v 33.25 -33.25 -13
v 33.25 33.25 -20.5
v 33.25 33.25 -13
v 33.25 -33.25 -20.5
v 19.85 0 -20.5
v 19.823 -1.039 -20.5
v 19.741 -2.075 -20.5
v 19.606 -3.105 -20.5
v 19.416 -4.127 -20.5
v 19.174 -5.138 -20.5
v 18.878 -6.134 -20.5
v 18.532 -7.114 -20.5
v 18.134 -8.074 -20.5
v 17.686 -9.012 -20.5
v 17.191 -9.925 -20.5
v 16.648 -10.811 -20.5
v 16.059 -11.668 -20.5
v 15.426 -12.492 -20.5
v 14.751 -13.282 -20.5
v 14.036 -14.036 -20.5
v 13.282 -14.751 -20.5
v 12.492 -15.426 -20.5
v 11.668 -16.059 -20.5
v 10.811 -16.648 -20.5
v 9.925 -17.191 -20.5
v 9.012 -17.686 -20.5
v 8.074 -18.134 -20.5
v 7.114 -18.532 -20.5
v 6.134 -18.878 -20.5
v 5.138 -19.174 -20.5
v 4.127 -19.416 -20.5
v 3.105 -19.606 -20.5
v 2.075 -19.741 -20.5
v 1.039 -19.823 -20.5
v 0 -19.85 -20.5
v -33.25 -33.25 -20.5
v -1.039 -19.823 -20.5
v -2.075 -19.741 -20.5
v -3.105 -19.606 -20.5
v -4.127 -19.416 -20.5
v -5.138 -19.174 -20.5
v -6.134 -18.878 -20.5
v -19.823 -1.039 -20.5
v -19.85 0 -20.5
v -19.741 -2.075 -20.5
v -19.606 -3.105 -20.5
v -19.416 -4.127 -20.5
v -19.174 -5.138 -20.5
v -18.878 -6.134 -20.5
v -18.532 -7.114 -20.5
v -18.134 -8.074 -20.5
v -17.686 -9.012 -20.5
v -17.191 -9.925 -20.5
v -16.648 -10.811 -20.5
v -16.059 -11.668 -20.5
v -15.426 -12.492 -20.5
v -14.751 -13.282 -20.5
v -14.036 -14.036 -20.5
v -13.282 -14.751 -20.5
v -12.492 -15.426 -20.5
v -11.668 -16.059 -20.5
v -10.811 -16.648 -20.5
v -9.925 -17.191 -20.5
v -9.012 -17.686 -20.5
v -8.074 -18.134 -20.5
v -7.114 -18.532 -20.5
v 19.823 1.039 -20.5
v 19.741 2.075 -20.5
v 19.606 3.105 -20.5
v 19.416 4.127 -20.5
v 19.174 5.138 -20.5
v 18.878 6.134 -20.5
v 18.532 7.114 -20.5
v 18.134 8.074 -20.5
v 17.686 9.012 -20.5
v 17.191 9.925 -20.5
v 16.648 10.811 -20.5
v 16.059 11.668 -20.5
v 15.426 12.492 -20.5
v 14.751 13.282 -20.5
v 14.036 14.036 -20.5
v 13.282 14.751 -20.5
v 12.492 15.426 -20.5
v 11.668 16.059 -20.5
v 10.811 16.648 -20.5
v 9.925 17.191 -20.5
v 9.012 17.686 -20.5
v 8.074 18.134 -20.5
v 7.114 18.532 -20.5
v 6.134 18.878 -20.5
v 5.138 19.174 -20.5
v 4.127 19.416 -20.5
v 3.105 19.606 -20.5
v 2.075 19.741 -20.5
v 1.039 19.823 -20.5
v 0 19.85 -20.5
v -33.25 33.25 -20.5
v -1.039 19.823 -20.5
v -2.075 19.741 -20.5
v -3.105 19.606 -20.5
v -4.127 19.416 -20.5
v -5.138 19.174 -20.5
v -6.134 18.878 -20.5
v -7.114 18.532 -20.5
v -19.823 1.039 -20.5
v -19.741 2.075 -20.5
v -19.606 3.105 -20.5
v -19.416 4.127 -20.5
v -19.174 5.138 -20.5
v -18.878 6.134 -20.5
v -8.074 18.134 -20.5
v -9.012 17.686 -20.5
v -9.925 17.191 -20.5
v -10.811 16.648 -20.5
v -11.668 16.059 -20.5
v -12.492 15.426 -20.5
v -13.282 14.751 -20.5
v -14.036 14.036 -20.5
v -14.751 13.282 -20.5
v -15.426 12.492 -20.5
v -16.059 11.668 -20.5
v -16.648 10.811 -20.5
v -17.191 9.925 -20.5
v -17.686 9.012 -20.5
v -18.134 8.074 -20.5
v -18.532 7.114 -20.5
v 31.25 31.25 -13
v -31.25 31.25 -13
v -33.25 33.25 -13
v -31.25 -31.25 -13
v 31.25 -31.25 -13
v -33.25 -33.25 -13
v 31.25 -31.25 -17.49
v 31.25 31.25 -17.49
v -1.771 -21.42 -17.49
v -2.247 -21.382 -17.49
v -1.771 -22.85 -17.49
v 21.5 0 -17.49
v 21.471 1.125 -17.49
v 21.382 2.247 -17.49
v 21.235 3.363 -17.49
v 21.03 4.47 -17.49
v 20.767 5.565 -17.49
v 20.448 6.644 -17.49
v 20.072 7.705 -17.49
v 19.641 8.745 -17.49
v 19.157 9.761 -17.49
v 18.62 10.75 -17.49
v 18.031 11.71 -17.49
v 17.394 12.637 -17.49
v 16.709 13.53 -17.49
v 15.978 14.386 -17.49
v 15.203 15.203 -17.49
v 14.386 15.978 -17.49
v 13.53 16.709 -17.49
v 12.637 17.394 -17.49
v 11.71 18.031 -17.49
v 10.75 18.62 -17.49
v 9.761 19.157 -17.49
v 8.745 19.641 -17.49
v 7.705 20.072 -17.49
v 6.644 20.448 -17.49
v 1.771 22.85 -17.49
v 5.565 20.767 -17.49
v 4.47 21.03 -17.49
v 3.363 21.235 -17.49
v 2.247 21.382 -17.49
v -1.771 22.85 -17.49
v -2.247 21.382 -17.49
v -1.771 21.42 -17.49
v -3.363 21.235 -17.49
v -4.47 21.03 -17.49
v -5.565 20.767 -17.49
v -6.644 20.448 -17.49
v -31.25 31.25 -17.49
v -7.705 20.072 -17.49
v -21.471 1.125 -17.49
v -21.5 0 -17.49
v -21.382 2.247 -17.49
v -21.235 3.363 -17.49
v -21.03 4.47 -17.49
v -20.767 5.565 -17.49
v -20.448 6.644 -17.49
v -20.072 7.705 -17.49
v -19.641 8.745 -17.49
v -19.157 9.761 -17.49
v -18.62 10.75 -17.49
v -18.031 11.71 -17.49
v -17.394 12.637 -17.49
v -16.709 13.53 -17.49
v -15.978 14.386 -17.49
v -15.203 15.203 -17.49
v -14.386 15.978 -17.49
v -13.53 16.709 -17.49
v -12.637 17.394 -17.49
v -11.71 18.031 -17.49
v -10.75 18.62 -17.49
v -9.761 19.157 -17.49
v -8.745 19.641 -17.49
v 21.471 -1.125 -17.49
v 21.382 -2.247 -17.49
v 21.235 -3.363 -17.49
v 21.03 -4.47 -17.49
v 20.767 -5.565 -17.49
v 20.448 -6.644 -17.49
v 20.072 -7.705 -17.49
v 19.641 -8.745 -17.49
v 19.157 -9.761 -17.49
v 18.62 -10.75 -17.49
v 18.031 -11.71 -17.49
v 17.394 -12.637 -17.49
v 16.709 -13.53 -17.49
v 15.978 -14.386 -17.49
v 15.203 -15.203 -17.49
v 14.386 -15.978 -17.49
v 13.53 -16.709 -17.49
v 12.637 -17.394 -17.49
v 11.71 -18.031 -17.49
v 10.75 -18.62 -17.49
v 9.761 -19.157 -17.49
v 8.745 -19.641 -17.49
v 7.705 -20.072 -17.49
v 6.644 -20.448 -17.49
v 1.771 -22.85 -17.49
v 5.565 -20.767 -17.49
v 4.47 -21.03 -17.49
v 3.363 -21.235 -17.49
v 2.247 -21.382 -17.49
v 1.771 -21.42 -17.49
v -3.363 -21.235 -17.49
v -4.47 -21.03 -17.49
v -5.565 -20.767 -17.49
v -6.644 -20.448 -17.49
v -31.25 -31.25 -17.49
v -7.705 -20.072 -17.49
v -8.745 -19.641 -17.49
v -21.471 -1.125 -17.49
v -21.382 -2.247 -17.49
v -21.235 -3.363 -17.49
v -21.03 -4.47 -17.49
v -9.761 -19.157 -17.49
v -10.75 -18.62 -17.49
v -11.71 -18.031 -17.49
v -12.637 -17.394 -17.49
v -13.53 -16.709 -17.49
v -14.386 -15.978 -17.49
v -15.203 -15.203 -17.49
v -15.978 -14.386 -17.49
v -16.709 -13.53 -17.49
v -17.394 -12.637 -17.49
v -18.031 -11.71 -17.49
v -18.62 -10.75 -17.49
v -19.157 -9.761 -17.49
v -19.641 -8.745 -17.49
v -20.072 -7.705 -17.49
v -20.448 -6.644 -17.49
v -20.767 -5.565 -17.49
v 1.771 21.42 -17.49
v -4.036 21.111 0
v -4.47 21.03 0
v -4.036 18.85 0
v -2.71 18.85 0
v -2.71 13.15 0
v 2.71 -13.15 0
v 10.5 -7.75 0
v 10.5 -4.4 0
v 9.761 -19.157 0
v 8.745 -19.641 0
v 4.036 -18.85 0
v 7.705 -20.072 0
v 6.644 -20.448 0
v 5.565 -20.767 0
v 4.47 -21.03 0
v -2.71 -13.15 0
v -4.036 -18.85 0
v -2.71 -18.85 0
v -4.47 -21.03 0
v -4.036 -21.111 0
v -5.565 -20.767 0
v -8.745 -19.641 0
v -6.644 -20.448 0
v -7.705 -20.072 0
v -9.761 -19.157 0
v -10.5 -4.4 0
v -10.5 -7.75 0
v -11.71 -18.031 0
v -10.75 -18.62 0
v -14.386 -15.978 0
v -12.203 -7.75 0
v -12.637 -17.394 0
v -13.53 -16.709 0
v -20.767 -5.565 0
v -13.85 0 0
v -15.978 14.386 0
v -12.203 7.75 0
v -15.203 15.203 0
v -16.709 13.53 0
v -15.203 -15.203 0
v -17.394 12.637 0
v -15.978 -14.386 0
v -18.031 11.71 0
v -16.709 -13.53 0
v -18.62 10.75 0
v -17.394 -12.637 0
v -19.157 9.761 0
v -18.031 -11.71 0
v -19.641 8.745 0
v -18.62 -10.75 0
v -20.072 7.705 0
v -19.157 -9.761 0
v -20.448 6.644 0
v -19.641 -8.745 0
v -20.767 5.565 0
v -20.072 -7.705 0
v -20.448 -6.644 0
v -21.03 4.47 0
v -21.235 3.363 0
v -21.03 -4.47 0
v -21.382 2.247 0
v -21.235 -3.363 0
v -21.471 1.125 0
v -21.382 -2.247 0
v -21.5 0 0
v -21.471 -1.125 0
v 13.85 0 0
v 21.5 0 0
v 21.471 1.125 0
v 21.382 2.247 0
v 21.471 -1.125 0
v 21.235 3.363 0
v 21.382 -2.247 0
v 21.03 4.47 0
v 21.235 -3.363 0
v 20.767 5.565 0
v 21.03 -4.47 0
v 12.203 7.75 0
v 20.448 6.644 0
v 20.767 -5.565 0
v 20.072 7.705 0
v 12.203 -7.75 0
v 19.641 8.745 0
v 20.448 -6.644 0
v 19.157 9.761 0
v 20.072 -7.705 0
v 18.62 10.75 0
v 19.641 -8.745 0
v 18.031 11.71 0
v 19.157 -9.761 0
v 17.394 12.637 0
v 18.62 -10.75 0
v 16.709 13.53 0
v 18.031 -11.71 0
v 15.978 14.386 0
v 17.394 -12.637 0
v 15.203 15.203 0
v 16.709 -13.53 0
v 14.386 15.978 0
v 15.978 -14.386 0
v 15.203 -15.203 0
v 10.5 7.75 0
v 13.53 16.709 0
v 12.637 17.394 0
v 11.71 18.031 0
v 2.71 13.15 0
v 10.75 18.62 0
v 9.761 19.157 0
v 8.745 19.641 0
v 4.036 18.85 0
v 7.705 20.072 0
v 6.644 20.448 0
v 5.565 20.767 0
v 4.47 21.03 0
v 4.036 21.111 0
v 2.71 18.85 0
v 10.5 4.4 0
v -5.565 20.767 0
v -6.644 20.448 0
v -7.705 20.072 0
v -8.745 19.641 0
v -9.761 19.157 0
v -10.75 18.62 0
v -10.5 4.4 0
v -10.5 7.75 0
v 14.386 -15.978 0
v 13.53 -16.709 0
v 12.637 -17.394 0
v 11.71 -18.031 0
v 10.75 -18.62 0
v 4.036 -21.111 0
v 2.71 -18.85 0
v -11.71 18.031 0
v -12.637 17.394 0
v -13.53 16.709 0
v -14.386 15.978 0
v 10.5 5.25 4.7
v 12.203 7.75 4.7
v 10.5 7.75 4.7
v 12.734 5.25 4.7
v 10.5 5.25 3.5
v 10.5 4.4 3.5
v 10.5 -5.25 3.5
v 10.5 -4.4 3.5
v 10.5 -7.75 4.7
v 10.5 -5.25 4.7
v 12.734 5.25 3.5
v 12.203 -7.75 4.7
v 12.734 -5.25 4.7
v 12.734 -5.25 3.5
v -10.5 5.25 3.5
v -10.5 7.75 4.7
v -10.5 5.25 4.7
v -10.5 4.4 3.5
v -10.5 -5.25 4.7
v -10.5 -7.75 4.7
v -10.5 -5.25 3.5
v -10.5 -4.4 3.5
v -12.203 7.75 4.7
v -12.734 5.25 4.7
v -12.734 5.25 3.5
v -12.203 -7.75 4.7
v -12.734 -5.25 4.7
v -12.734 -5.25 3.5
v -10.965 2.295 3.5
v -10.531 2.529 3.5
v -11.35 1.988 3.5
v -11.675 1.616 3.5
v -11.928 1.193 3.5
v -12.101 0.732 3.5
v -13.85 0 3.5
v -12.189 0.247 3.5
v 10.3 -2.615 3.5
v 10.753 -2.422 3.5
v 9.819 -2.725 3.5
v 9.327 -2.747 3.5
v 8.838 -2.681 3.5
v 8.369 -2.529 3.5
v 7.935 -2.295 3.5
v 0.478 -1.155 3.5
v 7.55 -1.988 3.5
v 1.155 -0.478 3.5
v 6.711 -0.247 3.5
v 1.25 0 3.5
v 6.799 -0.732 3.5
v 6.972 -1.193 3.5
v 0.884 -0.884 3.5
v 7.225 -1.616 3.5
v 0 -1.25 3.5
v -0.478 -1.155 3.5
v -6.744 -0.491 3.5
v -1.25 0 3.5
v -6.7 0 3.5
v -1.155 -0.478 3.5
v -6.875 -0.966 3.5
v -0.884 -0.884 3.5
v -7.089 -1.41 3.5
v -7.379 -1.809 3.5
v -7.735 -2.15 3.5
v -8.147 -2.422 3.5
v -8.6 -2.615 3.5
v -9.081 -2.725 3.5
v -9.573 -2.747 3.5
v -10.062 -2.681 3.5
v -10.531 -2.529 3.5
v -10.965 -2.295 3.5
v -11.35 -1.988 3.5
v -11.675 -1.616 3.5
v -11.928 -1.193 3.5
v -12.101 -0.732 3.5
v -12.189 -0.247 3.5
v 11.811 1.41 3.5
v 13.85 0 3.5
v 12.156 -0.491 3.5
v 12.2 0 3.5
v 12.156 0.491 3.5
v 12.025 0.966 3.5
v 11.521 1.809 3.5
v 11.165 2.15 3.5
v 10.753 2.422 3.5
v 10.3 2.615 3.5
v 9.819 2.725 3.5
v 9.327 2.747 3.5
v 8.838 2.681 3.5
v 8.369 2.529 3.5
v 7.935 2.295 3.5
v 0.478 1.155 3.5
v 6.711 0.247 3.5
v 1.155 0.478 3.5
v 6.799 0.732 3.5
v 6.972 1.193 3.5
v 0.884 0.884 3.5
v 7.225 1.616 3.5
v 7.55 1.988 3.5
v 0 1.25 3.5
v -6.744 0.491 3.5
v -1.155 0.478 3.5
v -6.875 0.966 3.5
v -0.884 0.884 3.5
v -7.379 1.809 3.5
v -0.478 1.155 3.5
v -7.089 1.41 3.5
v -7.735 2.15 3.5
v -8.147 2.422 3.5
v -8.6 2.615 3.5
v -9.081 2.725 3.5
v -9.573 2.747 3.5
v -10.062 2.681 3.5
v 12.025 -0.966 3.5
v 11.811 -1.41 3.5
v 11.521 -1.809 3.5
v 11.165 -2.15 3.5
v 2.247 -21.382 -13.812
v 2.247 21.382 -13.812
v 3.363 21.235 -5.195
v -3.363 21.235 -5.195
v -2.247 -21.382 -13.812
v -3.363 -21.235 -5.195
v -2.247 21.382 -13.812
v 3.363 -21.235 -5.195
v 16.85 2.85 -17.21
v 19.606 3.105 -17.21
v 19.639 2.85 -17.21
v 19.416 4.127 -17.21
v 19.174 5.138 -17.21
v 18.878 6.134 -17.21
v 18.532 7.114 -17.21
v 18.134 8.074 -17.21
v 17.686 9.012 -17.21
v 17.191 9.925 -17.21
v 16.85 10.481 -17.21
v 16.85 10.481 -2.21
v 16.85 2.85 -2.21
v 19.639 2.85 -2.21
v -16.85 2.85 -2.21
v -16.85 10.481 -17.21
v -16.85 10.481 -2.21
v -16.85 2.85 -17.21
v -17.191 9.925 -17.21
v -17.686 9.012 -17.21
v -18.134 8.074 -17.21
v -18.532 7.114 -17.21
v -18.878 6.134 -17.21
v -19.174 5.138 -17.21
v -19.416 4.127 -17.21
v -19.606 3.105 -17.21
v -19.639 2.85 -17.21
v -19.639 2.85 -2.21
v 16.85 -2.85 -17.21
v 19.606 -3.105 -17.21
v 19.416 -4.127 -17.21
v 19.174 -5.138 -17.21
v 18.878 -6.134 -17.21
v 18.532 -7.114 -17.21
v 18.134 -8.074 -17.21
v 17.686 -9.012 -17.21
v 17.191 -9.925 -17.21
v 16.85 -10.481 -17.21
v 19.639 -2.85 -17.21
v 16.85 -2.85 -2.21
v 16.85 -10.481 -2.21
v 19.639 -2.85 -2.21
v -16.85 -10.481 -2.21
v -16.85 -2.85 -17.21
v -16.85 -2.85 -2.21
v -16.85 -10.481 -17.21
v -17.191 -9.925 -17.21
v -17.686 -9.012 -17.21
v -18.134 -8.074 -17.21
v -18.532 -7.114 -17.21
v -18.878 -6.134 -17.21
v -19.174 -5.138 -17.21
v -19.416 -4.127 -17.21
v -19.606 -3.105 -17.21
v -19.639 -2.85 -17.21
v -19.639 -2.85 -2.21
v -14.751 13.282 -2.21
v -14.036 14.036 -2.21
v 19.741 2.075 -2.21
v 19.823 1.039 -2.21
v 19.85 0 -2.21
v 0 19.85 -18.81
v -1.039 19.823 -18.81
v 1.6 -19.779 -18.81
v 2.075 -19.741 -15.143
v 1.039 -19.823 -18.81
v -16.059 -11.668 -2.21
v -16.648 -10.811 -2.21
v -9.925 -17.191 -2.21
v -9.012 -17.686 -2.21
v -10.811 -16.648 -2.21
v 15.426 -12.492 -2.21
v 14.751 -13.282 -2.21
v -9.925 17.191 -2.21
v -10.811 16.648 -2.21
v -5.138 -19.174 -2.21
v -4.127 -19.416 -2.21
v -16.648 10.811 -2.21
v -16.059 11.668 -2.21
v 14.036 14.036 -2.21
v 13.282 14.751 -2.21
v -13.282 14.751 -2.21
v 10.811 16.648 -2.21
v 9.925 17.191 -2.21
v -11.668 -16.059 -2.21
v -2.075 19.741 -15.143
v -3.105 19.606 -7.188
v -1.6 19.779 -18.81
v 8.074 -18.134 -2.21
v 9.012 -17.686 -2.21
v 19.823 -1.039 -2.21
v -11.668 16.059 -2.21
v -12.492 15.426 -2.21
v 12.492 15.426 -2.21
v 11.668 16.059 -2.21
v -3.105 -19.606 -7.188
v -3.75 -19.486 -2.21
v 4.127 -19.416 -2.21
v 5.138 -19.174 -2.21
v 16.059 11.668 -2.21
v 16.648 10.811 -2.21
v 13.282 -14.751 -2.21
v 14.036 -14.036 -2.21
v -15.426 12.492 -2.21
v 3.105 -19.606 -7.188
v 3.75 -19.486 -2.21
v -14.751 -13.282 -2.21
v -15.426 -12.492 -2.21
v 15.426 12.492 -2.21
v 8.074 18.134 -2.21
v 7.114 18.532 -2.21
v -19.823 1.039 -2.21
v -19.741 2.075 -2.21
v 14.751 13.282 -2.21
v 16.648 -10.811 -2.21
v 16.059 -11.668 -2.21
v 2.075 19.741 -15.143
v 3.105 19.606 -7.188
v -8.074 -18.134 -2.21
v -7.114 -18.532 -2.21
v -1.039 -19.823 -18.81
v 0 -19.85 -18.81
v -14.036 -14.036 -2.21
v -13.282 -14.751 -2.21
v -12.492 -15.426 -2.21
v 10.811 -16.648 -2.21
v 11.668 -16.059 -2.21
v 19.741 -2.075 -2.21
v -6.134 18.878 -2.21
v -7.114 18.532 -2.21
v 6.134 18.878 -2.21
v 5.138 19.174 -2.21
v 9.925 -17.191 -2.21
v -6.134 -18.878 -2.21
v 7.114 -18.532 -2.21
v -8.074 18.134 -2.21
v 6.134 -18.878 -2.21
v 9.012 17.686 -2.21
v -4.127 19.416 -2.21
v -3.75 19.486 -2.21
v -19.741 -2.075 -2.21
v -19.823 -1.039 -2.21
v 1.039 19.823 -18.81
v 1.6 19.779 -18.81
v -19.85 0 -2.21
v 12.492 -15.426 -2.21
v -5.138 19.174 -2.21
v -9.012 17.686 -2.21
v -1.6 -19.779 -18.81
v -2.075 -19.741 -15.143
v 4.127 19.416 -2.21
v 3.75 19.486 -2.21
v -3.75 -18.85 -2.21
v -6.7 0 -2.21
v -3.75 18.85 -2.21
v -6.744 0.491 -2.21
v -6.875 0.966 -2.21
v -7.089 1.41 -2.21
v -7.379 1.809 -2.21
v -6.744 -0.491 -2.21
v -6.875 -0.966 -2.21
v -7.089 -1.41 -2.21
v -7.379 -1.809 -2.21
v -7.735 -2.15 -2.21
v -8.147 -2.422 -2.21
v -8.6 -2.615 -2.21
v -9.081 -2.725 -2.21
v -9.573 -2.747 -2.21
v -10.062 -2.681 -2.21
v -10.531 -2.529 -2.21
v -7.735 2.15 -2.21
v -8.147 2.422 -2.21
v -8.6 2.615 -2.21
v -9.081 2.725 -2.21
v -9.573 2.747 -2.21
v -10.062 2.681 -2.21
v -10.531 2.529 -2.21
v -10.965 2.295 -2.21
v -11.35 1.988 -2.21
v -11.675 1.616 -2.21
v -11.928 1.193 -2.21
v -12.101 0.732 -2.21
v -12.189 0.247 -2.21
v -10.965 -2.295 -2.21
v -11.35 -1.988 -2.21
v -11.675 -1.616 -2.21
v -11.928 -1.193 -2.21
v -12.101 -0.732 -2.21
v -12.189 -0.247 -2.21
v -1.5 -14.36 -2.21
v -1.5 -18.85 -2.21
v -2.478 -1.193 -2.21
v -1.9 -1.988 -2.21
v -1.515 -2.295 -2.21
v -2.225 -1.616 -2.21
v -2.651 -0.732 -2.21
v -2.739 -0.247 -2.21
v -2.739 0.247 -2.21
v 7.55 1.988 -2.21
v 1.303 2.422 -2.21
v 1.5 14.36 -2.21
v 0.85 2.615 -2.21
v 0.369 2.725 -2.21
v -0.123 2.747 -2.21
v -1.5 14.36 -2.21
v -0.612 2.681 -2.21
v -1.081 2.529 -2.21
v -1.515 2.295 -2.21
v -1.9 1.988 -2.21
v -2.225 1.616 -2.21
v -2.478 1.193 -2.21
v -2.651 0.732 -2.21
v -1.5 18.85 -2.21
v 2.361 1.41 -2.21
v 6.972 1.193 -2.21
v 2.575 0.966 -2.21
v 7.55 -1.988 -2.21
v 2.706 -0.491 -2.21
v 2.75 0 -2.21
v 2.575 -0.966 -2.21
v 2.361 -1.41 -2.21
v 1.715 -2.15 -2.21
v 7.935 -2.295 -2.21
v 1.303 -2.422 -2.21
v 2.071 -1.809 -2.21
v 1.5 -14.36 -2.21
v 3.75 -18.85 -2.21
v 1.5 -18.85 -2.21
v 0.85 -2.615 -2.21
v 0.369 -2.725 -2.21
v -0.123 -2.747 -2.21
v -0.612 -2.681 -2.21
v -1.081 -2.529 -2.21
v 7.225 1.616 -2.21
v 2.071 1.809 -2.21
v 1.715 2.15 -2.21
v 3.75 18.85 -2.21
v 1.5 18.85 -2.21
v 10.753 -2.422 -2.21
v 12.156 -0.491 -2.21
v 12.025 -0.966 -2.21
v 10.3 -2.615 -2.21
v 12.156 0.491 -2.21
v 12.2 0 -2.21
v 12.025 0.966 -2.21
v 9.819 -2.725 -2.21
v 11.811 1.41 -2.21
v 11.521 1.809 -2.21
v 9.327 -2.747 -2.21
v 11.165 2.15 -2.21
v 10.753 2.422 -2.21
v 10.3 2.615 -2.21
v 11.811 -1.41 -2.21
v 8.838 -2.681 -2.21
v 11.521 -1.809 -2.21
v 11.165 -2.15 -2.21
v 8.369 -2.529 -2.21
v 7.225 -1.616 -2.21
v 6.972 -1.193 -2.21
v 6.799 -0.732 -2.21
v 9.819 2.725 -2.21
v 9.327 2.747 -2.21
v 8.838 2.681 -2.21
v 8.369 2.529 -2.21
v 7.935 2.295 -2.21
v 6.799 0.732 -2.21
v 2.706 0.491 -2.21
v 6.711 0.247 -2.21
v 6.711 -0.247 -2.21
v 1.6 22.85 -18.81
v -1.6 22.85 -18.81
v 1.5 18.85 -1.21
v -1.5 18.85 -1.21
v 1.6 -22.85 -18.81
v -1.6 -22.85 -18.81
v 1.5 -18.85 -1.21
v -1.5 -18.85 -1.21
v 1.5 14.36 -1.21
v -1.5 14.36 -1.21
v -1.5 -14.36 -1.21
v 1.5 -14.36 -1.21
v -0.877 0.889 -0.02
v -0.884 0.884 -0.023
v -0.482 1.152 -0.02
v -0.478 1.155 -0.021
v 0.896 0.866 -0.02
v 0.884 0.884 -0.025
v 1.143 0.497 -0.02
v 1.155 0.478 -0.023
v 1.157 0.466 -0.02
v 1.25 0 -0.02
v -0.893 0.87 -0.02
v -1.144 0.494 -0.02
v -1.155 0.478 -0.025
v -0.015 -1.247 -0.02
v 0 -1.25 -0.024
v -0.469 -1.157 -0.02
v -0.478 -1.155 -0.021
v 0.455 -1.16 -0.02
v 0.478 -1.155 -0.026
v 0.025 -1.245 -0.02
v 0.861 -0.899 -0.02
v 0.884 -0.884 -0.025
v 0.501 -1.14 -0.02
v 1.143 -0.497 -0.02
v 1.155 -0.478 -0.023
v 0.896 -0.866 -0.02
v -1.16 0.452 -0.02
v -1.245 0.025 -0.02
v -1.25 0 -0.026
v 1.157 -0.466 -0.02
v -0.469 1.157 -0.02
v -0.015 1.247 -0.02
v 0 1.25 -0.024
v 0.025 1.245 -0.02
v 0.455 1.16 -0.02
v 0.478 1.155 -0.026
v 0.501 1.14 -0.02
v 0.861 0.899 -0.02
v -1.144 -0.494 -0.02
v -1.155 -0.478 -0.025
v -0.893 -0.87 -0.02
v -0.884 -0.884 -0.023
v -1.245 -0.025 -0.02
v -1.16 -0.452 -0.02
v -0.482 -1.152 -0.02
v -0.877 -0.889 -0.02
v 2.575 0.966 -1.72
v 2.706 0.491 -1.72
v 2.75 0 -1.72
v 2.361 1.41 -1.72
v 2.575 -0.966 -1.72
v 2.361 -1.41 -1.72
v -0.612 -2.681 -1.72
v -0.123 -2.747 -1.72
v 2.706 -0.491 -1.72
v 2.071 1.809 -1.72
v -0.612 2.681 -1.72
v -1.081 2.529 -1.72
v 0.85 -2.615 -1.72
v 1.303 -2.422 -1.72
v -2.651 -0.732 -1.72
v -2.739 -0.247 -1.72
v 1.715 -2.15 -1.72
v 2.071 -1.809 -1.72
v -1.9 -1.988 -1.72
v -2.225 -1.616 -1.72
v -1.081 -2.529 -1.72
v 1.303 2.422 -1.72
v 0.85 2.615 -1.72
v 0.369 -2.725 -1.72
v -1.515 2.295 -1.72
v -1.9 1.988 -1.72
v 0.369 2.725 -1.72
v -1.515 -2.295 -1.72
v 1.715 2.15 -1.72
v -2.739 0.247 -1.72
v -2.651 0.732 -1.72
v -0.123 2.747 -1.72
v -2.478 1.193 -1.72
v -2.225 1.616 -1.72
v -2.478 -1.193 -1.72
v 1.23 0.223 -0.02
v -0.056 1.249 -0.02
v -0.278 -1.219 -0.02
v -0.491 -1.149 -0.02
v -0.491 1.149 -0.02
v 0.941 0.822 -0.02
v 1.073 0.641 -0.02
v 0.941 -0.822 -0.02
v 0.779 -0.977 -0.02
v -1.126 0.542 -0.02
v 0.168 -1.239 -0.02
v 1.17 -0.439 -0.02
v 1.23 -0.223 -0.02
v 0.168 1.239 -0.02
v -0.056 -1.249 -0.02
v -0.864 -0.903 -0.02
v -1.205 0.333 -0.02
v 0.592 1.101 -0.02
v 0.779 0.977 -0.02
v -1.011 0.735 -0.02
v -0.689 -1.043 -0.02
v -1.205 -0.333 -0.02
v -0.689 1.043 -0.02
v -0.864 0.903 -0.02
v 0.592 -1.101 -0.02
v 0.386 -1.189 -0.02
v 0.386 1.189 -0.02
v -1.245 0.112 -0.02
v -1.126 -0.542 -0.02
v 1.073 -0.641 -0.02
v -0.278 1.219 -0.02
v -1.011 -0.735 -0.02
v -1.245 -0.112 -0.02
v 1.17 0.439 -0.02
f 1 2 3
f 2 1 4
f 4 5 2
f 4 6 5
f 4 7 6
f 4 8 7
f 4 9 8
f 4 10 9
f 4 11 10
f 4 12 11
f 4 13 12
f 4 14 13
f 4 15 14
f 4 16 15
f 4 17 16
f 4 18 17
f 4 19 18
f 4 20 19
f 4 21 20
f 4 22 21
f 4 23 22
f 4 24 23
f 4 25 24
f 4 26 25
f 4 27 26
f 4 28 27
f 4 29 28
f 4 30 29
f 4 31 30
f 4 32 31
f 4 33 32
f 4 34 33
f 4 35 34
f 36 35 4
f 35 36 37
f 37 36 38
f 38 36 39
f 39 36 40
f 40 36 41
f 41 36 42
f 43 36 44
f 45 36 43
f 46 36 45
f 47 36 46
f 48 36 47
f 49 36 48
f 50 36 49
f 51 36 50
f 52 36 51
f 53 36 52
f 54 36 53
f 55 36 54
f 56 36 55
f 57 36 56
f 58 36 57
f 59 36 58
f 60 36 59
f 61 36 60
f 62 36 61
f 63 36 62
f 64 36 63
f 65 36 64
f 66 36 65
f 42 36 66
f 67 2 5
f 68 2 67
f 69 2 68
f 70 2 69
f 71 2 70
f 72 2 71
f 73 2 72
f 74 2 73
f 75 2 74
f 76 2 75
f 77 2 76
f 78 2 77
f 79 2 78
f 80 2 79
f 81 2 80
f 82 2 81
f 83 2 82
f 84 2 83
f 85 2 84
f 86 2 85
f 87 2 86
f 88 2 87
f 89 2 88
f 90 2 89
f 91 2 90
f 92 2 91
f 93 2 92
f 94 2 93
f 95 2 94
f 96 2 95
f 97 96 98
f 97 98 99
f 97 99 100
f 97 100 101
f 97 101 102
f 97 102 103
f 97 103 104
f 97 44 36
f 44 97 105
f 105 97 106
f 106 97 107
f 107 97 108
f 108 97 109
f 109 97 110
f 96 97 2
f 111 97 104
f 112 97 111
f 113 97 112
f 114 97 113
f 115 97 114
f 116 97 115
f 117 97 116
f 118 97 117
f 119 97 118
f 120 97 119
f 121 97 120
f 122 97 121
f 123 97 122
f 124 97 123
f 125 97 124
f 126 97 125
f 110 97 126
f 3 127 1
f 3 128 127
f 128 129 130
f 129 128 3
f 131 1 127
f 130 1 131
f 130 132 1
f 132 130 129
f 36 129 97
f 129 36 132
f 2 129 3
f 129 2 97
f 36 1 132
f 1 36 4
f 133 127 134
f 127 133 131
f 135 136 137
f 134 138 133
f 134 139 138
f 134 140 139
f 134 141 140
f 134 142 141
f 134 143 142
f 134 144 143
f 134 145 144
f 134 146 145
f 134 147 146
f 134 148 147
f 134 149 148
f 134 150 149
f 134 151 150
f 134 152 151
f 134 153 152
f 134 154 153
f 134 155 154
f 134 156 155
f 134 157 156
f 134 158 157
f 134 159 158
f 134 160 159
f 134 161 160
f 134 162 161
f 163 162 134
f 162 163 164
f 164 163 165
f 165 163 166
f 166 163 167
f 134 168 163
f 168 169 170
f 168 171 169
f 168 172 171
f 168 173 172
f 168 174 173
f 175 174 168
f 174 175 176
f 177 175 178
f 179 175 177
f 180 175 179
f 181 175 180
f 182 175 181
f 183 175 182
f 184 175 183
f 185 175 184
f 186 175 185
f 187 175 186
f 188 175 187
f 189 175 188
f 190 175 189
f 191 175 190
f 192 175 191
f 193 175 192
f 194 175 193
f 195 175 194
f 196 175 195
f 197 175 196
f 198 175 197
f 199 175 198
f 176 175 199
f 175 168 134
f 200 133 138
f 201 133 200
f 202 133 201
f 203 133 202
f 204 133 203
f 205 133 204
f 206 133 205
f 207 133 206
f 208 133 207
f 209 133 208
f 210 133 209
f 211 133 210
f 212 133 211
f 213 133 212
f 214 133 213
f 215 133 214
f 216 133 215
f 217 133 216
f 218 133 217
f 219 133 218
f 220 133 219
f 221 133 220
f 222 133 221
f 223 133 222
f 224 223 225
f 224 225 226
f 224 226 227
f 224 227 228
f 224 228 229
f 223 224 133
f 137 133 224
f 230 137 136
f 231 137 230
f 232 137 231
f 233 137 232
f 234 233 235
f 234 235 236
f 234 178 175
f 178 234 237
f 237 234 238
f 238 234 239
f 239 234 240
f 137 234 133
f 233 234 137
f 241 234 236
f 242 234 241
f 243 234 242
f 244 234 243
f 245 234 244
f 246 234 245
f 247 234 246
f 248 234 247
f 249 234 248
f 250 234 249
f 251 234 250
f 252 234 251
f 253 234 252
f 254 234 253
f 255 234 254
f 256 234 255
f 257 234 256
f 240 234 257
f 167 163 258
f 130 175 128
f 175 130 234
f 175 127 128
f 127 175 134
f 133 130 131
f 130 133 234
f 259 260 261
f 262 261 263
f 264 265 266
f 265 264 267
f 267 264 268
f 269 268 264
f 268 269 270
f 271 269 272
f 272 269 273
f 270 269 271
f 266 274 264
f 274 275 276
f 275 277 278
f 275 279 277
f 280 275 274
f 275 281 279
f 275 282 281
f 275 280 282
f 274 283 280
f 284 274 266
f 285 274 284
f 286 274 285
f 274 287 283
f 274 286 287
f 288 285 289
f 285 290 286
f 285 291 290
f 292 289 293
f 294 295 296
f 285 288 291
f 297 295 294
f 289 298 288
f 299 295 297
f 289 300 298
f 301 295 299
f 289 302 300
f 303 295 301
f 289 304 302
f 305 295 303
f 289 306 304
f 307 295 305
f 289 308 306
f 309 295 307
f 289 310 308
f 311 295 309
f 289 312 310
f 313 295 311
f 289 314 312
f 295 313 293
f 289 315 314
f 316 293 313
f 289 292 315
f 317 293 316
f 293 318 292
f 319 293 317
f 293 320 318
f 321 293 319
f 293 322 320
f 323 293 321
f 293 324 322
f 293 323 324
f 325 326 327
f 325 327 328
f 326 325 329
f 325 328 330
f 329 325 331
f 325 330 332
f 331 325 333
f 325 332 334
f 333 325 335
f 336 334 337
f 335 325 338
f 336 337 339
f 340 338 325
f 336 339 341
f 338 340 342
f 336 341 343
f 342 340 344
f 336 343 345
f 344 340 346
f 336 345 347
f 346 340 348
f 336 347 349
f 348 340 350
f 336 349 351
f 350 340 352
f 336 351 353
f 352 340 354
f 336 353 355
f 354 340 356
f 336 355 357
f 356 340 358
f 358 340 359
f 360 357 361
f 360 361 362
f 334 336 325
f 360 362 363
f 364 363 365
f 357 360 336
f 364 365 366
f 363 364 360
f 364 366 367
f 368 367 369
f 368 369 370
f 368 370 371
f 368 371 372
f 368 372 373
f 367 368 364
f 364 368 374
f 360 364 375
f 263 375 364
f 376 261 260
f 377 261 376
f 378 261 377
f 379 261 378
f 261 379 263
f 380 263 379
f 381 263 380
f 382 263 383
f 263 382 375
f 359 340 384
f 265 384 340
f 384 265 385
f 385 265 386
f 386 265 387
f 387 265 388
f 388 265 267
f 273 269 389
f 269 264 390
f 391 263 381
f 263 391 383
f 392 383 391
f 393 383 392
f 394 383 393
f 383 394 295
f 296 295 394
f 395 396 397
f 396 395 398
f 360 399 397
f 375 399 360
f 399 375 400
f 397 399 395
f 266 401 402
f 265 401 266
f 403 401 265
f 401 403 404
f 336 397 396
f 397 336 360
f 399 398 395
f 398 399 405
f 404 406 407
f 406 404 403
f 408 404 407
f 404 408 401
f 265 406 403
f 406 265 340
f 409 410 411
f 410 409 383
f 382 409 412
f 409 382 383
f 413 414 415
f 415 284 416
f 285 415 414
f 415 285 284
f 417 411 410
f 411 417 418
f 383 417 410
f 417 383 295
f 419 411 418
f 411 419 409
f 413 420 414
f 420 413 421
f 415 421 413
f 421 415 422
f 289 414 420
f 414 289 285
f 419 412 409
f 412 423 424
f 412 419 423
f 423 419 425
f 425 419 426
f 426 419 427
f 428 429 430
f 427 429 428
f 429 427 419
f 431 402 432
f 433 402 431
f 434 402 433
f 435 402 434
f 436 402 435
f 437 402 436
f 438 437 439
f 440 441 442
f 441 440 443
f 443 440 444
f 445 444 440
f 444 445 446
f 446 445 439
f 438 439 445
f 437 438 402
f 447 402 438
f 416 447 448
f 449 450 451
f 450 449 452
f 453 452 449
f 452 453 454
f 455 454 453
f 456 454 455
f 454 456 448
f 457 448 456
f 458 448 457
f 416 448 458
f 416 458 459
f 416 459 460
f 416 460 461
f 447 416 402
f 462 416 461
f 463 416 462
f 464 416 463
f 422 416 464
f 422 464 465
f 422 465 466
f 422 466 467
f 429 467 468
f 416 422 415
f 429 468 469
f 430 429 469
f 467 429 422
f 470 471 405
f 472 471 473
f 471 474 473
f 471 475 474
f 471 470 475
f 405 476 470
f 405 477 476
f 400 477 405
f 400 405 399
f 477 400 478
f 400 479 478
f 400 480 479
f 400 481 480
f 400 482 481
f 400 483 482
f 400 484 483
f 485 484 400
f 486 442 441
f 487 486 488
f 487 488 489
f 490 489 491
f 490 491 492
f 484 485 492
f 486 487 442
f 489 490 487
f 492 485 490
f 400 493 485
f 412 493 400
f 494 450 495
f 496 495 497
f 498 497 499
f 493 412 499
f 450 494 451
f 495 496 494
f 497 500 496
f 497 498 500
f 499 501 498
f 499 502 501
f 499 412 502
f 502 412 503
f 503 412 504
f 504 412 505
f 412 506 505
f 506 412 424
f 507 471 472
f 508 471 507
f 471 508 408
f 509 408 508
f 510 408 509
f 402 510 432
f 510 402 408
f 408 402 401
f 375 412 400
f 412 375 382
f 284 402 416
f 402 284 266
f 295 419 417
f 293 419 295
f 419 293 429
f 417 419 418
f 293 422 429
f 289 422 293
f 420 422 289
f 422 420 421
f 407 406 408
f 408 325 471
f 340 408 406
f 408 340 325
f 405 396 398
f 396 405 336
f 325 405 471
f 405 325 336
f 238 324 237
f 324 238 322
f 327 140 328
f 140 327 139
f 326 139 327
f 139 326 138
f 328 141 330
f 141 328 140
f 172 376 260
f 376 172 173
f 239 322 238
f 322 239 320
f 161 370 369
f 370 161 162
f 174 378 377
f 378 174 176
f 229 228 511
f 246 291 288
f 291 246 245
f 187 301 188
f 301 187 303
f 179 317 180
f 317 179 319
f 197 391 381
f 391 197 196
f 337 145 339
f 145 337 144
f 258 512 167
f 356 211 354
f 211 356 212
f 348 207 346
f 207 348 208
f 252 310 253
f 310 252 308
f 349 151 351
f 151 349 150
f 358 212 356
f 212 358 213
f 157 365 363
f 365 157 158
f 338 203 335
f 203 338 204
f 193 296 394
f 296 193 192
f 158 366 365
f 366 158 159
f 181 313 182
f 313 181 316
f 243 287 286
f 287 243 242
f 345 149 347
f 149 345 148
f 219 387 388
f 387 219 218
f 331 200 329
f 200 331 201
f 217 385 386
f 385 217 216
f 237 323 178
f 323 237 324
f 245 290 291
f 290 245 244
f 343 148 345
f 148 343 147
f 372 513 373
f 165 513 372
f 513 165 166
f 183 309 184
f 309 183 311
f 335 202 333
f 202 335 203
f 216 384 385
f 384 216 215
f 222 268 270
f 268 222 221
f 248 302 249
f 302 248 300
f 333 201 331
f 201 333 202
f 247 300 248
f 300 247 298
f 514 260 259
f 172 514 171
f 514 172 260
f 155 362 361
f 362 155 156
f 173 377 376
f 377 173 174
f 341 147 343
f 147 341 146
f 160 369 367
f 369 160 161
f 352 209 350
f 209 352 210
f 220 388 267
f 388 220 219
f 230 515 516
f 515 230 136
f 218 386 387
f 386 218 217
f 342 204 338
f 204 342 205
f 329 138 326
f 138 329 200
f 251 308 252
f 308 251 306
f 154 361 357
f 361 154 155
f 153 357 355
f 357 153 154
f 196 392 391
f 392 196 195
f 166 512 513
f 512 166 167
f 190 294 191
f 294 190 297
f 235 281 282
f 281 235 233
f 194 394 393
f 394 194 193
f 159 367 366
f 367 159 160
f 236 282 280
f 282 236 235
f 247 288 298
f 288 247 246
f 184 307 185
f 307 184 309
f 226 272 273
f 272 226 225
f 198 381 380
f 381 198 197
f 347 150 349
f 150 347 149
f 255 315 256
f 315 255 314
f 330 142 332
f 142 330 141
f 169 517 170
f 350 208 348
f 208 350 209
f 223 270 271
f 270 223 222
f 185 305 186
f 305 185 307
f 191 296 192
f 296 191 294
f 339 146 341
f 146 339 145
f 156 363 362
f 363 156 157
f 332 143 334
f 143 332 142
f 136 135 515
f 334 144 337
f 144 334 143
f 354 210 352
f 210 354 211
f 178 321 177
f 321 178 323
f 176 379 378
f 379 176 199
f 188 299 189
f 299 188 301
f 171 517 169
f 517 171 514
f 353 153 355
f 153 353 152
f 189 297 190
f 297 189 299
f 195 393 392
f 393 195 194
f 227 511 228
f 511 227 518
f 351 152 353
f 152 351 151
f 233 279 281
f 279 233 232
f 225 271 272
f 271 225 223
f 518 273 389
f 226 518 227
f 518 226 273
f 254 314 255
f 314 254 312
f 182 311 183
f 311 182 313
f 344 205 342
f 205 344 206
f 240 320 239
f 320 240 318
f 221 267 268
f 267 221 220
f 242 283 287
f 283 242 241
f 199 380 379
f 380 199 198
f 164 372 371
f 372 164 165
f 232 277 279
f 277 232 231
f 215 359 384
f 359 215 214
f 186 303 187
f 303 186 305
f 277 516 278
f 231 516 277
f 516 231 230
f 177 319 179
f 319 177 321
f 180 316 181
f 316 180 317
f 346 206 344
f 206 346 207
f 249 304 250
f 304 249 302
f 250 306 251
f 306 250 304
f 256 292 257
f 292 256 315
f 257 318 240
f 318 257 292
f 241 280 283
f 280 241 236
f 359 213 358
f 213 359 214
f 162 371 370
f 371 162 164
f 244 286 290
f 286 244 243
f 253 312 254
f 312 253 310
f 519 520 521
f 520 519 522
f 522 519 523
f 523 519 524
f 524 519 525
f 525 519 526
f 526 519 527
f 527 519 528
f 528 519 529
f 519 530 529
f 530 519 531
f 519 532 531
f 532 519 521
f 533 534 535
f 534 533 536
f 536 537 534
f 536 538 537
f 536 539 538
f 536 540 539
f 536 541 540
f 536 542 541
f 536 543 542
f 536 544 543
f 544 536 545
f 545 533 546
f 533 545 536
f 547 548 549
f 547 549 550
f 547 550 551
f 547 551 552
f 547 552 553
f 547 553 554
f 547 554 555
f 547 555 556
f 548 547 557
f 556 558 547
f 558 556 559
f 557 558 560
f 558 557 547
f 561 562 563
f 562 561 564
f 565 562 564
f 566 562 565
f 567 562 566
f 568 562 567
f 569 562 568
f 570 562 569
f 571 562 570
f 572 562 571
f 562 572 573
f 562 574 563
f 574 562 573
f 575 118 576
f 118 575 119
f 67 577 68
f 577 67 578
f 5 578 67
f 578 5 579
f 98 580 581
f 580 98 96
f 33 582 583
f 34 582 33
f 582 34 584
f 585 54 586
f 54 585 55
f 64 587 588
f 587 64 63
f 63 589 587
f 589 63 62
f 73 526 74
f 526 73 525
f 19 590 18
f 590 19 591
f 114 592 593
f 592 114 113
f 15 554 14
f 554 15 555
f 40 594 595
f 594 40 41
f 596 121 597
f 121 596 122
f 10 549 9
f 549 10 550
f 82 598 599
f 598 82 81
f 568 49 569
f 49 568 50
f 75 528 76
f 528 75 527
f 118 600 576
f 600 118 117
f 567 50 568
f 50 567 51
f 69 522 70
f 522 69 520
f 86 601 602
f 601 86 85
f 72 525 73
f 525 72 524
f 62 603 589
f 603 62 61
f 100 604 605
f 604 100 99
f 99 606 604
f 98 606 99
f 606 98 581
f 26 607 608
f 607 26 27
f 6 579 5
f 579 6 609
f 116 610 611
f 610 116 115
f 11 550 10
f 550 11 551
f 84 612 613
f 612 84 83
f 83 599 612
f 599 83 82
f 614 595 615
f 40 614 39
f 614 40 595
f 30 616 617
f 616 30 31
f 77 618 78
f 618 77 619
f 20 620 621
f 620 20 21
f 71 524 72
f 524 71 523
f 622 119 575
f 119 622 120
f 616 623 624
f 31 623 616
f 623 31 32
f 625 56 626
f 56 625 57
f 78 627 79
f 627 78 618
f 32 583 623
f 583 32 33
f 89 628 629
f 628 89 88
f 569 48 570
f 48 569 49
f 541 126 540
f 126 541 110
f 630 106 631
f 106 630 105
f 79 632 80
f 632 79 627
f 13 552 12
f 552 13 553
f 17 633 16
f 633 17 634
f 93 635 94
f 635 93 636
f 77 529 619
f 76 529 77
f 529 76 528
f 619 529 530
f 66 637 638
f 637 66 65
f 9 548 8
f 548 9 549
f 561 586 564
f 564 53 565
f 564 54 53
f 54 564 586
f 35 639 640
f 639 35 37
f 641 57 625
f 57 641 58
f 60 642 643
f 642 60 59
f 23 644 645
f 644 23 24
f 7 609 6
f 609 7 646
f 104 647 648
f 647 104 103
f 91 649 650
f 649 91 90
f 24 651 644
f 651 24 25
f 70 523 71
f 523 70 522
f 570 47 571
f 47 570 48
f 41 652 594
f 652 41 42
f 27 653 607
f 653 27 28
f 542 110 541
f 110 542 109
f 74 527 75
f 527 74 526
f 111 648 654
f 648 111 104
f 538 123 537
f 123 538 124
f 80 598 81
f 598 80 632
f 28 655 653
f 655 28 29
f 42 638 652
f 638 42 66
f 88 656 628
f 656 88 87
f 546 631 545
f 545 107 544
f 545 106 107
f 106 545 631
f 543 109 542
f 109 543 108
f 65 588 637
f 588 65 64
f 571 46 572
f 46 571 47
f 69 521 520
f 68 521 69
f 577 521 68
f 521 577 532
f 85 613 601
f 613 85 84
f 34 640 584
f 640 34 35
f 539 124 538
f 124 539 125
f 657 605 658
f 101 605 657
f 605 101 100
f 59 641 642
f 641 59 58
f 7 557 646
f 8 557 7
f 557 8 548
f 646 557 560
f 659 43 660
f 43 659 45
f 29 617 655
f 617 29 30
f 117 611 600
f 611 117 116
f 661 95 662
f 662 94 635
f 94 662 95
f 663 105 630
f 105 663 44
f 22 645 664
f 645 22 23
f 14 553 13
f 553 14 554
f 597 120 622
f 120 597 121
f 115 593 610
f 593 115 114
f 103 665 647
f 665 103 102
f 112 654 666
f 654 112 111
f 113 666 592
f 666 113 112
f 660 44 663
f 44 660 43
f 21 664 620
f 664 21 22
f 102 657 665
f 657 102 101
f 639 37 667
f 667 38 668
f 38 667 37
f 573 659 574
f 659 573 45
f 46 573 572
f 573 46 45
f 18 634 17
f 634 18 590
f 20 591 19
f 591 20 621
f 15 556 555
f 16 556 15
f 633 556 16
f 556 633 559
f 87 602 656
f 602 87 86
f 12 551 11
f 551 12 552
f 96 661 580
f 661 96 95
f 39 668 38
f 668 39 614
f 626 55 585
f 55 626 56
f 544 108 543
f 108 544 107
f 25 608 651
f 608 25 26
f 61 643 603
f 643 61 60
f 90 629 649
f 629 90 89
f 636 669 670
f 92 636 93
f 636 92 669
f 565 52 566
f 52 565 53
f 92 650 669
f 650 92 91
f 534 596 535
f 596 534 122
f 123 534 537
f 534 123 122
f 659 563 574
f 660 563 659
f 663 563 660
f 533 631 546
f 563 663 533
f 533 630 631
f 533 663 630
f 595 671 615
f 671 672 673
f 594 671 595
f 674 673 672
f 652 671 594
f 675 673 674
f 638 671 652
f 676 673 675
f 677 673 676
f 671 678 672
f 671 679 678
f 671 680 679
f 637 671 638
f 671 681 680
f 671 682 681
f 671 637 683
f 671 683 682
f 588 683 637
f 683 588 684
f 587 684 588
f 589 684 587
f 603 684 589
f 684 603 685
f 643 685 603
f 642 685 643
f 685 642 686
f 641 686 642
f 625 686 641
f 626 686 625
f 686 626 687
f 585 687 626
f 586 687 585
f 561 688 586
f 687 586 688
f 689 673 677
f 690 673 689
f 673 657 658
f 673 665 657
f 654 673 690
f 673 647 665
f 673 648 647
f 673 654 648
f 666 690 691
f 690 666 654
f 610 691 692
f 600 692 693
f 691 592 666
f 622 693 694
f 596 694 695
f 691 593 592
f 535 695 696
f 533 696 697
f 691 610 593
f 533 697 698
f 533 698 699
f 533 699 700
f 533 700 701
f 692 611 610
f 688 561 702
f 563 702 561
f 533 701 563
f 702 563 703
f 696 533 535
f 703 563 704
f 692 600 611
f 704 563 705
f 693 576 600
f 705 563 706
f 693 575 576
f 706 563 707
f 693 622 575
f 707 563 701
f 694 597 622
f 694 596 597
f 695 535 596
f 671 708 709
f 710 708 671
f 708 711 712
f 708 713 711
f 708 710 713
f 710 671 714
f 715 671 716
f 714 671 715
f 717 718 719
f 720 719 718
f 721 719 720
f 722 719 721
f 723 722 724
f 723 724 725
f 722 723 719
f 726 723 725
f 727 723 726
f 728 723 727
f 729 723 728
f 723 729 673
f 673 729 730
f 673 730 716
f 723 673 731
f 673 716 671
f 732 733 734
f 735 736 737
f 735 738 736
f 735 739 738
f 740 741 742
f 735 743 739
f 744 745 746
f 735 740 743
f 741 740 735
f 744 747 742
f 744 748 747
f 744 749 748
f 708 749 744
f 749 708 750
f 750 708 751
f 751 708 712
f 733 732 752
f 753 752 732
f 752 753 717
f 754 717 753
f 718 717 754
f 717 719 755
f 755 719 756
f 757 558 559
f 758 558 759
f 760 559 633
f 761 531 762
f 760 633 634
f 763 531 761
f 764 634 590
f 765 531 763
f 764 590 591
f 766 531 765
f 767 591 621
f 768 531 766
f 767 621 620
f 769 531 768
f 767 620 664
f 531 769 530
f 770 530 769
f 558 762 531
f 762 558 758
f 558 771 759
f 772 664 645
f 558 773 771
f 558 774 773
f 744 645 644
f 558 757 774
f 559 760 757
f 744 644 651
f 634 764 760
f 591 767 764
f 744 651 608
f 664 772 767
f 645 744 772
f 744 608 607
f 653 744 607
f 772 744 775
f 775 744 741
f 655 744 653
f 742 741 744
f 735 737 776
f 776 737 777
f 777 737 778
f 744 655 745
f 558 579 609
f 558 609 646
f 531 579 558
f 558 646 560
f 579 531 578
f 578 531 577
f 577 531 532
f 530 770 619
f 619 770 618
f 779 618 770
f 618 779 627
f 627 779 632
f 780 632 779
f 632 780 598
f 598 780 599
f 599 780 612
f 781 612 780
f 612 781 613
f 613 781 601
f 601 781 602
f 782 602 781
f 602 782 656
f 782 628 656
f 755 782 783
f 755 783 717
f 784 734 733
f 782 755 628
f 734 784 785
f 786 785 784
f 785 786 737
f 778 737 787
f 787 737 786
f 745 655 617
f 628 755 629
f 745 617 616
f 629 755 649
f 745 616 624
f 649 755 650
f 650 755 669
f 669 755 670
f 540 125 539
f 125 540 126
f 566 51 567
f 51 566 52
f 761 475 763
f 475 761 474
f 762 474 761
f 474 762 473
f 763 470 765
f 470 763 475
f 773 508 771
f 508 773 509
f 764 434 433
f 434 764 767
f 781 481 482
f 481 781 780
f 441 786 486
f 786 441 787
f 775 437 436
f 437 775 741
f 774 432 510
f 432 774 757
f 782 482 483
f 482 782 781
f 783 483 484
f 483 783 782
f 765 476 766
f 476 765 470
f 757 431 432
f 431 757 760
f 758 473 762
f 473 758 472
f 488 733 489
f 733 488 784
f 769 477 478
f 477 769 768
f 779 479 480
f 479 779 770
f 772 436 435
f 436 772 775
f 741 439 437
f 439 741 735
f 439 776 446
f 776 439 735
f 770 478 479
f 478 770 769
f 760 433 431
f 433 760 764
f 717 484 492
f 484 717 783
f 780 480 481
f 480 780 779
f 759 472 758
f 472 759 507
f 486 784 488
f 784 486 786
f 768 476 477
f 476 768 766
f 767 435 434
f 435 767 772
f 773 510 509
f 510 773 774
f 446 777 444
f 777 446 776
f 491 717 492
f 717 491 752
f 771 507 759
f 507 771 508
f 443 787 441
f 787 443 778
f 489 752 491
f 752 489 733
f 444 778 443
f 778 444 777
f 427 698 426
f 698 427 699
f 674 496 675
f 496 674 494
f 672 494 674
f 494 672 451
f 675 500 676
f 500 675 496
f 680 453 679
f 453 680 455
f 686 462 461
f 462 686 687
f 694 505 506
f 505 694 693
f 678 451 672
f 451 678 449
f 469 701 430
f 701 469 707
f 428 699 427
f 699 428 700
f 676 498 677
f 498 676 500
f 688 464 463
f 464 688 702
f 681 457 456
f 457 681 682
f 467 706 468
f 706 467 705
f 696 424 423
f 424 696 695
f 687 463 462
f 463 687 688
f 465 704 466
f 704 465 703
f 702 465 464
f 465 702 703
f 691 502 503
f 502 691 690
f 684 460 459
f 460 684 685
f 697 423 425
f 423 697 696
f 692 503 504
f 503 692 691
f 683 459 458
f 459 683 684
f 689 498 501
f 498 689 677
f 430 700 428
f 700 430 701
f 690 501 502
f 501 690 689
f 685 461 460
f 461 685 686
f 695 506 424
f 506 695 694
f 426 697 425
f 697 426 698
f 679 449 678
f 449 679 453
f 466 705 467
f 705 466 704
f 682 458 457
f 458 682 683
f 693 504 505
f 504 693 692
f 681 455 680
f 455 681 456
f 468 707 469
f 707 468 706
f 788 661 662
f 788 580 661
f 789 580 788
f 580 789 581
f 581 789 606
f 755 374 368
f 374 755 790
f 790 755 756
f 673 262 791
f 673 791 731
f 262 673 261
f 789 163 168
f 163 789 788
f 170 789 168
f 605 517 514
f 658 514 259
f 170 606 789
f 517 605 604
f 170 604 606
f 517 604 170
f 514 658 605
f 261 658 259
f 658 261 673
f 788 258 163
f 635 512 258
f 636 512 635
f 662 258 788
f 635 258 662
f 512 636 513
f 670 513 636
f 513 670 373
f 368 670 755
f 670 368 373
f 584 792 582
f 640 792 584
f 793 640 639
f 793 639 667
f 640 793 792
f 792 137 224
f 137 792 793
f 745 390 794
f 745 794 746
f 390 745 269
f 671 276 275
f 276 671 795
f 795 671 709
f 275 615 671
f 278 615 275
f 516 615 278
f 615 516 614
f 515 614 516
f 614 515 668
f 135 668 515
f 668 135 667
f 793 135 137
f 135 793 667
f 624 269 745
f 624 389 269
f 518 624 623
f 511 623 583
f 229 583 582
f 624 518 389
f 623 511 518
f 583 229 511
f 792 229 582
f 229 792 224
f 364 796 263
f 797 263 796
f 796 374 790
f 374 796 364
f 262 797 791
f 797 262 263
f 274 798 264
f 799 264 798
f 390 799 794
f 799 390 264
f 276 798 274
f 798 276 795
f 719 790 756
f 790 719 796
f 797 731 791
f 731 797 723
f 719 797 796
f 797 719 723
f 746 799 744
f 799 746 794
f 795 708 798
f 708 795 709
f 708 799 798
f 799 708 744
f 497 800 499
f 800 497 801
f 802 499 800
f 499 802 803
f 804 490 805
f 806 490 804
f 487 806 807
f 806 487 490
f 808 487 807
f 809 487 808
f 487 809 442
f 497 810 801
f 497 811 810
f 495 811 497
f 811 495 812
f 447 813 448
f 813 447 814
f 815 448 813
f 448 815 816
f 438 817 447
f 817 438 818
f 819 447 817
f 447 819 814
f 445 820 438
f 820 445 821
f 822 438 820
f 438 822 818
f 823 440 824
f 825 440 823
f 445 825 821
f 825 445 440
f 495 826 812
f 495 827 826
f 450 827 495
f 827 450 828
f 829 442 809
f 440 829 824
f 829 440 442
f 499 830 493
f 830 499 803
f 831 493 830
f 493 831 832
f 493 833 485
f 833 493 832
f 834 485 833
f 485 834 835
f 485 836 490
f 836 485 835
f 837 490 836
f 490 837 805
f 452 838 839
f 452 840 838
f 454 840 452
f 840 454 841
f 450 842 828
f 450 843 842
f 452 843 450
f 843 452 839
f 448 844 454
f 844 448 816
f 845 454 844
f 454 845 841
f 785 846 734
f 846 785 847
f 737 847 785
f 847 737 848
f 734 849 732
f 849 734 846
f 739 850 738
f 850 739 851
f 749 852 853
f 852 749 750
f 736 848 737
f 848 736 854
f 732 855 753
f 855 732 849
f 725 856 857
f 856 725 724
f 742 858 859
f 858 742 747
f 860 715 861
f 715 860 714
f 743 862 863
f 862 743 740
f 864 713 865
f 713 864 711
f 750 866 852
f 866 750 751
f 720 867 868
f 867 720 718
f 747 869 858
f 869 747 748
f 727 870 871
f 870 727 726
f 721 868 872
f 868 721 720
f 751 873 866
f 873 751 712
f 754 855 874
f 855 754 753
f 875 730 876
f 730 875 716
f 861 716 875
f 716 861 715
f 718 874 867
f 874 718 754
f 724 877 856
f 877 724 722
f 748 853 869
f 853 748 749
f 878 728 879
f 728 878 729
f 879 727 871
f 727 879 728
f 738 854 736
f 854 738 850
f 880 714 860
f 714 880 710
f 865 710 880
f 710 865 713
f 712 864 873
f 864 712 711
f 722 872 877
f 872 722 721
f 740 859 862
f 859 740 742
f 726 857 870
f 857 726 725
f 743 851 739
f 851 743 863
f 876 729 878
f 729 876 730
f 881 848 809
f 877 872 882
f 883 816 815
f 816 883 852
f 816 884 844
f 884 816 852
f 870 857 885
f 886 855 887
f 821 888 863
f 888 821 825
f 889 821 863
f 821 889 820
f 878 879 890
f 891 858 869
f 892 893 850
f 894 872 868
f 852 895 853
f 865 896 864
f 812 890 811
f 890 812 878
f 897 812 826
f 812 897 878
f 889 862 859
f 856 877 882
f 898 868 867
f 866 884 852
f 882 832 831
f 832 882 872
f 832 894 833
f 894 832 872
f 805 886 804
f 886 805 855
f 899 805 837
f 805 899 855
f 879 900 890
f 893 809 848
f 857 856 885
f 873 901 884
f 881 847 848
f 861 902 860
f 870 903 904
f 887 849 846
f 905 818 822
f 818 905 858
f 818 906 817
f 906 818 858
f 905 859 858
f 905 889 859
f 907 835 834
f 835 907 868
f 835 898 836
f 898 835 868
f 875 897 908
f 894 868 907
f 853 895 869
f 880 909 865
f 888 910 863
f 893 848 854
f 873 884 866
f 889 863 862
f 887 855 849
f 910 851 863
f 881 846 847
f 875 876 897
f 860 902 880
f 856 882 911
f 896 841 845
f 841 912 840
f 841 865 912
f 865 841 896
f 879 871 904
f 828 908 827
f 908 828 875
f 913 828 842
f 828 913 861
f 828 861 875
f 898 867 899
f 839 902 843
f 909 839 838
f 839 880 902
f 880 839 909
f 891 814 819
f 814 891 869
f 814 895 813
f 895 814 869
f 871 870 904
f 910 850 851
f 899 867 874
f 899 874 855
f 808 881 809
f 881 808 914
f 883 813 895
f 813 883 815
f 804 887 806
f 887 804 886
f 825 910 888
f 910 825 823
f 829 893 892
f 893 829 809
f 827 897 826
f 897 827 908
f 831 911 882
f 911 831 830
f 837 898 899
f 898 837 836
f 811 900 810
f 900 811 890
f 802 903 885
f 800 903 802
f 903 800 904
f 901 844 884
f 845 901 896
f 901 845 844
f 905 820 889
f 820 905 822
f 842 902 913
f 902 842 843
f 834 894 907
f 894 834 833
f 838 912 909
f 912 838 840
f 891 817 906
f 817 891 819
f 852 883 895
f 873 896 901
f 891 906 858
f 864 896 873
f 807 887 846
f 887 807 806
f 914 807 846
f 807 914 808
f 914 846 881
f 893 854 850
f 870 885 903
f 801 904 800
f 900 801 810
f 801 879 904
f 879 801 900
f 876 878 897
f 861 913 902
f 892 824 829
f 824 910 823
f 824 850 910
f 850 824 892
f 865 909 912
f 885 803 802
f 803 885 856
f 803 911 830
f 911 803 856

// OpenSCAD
// file: lib/lib/slice.scad
// Starts at Y-axis in negative clock direction
module slice (r = 10, h = 10, ang = 30) {
    aa = (ang % 360 > 0) ? ang % 360 : ang % 360 + 360;
    rotate (-90) {
        difference() {
            cylinder (r = r, h = h);
            if (aa > 180)
                intersection_for (a = [0, 180 - aa])
                    rotate(-a) translate([-r, 0, -h])
                        cube ([r * 2, r * 2, 3 * h]);
            else union() for (a = [0, 180 - aa])
                rotate(-a) translate([-r, 0, -h])
                    cube ([r * 2, r * 2, 3 * h]);
        }
    }
}
// file: lib/arc.scad
use <lib/slice.scad>
// starts at y axis + a1 in clock direction, continues for a2.
module arc (a1, a2, r, fw, h)
{
    rotate ([0, 0, a1])
    {
        difference () {
            slice (r, h, a2);
            rotate ([0, 0, -1])
                translate ([0, 0, -h])
                    slice (r - fw, 3 * h, a2 + 2);
        }
    }
}
// main file
use <lib/arc.scad>

// see calculations in steckdose.wxm

module outside (da, dm, iw, th)
{
    // da: outer diameter
    // dm: medium diameter
    // iw: inner width
    // th: thickness
    a   = iw / 2;
    b   = (dm - da) / 2;
    r   = (b * b + a * a) / (2 * b);
    z   = da / 2;
    c   = z - a;
    phi = 2 * acos ((r - b) / r);
    m2  = -(a * z - a * r + a * b) / (r - b - a);
    r2  = sqrt (pow (z - m2, 2) + pow (a - m2, 2));
    alpha = acos ((pow (r2, 2) - pow (c, 2)) / pow (r2, 2));
    echo (a, m2, r2, alpha);
    echo (-(a - m2) / (z - m2));
    echo (a / (b - r));
    for (rot = [0, 90, 180, 270]) {
        rotate ([0, 0, rot]) {
            translate ([0, z + b - r, 0])
                arc (-phi / 2, phi, r, th, 10, $fa = 3);
            translate ([m2, m2, 0])
                arc (-(45 + alpha / 2 + 1), alpha + 2, r2, th, 10, $fa = 3);
        }
    }
}

module groundhole_flat (w1=4, w2=8, h=2, l=10)
{
    a = atan (h / ((w2-w1)/2));
    difference () {
        translate ([0, 0, -2*h])
            cube ([l, w2, 6*h], center = true);
        for (k=[-1, 1])
            translate ([k*l/2, 0, 0])
                rotate ([0, -180+k*a, 0])
                    translate ([0, 0, -10])
                        cube (20, center = true);
        for (k=[-1, 1])
            translate ([0, k*w2/2, 0])
                rotate ([180-k*a, 0, 0])
                    translate ([0, 0, -10])
                        cube (20, center = true);
    }
}

module groundhole (ld, ud, h, w=4, d=4)
{
    a = atan ((ld - ud) / 2 / h);
    rotate ([180, 0, 0]) translate ([0, -w/2, 0]) {
        translate ([-ud/2, 0, 0])
            cube ([ud, w, h + d]);
        translate ([-ud/2, 0, 0])
            rotate ([0, -a, 0])
                cube ([ud, w, h + d]);
        translate ([ud/2, 0, 0])
            rotate ([0, a, 0])
                translate ([-ud, 0, 0])
                    cube ([ud, w, h + d]);
    }
}

// Inside of a DIN power outlet -- negative (to subtract from something)
// dia:  dia of plug hole
// w:    width of plug hole between flattened sides
// w2:   width of non-flattened part in the middle
// hdia: connector hole diameter
// ld:   lower diameter of ground hole at side
// ud:   upper diameter of ground hole at side
// ghw:  ground hole diameter at bottom
// ghh:  ground hole height (on side) measured from top
// ghd:  ground hole depth (at bottom)
// h:    height of plug hole
// h2:   height of flattened side
// cd:   connector distance (between inner hole borders)
module inside
    ( dia=39.2+.5, w=33.2+.5, w2=5.2+.5, hdia=5.5
    , ld=7.5, ud=3.2, ghw=3, ghh=1.2, ghd=5.5
    , h=17.8, h2=14, cd=13.4, 
    )
{
    r = dia / 2;
    xx = (dia - w) / 2;
    //translate ([0, 0, -h]) {
    translate ([0, 0, 0]) {
        union () {
            difference () {
                cylinder (r = r, h = h + 1);
                for (y = [1, -1]) {
                    for (x = [1, -1]) {
                        translate ([x * (3*r/2 - xx), y * (r/2 + w2/2), h2/2]) {
                            cube ([r, r, h2 + 2], center = true);
                        }
                    }
                }
            }
            for (x = [1, -1]) {
                translate ([x*(cd+hdia)/2, 0, -h/2])
                    cylinder (r = hdia / 2, h = 10);
            }
            for (y = [1, -1]) {
                translate ([0, y*(r+1), (h-ghh)])
                    groundhole (ld, ud, h-ghh);
            }
            for (y = [1, -1]) {
                translate ([0, y*(r-ghd/2+.01), -2])
                    cube ([ghw, ghd, 4.1], center = true);
                translate ([0, y*(r-ghd/2+.01), -3])
                    rotate ([0, 0, 90])
                        groundhole_flat (w1=ghw, w2=ghw+4, l=ghd + 4, h=2);
            }
        }
    }
}

module outlet_single
    ( h=66.5, w=66.5, dia=43, sc=2.5, sch=5.5, t=3
    , sd=2.7, hr=7.5, hi=2, hc=20.5, hs=24
    , ql=27.7, qw=8.8, q2w=2.5, q2l=15.5, q2d=26, q3h=1.2
    )
{
    render (convexity=10)
    difference () {
        union () {
            translate ([0, 0, -hr + hc]) {
                difference () {
                    translate ([0, 0, hr/2])
                    cube ([h, w, hr], center = true);
                    translate ([0, 0, (hr-t)/2-.01])
                        cube ([h - 2*hi, w - 2*hi, hr - t], center = true);
                }
            }
            cylinder (r=dia/2, h=hc);
            difference () {
                union () {
                    translate ([0, 0, -(hs-hc)/2])
                        cube ([ql, qw, hs-hc], center=true);
                    for (x=[-1,1]) {
                        translate ([(q2w/2-q2d/2)*x, 0, -(hs-hc)/2])
                            cube ([q2w, q2l, hs-hc], center=true);
                        for (y=[-1,1]) {
                            translate
                              ([(q2w-q2d)*x/2, y*(q2w-q2l)/2, -(hs-hc+q3h)/2])
                                cube ([q2w, q2w, hs-hc+q3h], center=true);
                        }
                    }
                }
                for (x=[-1,1]) {
                    for (y=[-1,1]) {
                        translate ([x*ql/2, 0, 0])
                            rotate ([0, 0, 12*y])
                                translate ([x*2*qw, 0, -(hs-hc+q3h)])
                                    cube
                                        ( [4*qw, 4*qw, 3*(hs-hc+q3h)]
                                        , center = true
                                        );
                    }
                }
            }
        }
        translate ([0, 0, 2.21]) inside ();
        translate ([0, 0, 2.21+.01]) {
            translate ([0, 0, -50])
                cylinder (r=sc/2,  h=50);
            translate ([0, 0, -.5])
                cylinder (r=sch/2, h=.5);
            translate ([0, 0, -.5-1.7])
                cylinder (r1=sc/2, r2=sch/2, h=1.7);
        }
    }
}

//outside (100.25, 106.5, 81.25, 2);
//inside ();
//groundhole (ld=7.5, ud=3.2, h=17.8-1.2);
mirror ([0, 0, 1])
    outlet_single ($fa=3, $fs=.5);
//groundhole_flat ();
